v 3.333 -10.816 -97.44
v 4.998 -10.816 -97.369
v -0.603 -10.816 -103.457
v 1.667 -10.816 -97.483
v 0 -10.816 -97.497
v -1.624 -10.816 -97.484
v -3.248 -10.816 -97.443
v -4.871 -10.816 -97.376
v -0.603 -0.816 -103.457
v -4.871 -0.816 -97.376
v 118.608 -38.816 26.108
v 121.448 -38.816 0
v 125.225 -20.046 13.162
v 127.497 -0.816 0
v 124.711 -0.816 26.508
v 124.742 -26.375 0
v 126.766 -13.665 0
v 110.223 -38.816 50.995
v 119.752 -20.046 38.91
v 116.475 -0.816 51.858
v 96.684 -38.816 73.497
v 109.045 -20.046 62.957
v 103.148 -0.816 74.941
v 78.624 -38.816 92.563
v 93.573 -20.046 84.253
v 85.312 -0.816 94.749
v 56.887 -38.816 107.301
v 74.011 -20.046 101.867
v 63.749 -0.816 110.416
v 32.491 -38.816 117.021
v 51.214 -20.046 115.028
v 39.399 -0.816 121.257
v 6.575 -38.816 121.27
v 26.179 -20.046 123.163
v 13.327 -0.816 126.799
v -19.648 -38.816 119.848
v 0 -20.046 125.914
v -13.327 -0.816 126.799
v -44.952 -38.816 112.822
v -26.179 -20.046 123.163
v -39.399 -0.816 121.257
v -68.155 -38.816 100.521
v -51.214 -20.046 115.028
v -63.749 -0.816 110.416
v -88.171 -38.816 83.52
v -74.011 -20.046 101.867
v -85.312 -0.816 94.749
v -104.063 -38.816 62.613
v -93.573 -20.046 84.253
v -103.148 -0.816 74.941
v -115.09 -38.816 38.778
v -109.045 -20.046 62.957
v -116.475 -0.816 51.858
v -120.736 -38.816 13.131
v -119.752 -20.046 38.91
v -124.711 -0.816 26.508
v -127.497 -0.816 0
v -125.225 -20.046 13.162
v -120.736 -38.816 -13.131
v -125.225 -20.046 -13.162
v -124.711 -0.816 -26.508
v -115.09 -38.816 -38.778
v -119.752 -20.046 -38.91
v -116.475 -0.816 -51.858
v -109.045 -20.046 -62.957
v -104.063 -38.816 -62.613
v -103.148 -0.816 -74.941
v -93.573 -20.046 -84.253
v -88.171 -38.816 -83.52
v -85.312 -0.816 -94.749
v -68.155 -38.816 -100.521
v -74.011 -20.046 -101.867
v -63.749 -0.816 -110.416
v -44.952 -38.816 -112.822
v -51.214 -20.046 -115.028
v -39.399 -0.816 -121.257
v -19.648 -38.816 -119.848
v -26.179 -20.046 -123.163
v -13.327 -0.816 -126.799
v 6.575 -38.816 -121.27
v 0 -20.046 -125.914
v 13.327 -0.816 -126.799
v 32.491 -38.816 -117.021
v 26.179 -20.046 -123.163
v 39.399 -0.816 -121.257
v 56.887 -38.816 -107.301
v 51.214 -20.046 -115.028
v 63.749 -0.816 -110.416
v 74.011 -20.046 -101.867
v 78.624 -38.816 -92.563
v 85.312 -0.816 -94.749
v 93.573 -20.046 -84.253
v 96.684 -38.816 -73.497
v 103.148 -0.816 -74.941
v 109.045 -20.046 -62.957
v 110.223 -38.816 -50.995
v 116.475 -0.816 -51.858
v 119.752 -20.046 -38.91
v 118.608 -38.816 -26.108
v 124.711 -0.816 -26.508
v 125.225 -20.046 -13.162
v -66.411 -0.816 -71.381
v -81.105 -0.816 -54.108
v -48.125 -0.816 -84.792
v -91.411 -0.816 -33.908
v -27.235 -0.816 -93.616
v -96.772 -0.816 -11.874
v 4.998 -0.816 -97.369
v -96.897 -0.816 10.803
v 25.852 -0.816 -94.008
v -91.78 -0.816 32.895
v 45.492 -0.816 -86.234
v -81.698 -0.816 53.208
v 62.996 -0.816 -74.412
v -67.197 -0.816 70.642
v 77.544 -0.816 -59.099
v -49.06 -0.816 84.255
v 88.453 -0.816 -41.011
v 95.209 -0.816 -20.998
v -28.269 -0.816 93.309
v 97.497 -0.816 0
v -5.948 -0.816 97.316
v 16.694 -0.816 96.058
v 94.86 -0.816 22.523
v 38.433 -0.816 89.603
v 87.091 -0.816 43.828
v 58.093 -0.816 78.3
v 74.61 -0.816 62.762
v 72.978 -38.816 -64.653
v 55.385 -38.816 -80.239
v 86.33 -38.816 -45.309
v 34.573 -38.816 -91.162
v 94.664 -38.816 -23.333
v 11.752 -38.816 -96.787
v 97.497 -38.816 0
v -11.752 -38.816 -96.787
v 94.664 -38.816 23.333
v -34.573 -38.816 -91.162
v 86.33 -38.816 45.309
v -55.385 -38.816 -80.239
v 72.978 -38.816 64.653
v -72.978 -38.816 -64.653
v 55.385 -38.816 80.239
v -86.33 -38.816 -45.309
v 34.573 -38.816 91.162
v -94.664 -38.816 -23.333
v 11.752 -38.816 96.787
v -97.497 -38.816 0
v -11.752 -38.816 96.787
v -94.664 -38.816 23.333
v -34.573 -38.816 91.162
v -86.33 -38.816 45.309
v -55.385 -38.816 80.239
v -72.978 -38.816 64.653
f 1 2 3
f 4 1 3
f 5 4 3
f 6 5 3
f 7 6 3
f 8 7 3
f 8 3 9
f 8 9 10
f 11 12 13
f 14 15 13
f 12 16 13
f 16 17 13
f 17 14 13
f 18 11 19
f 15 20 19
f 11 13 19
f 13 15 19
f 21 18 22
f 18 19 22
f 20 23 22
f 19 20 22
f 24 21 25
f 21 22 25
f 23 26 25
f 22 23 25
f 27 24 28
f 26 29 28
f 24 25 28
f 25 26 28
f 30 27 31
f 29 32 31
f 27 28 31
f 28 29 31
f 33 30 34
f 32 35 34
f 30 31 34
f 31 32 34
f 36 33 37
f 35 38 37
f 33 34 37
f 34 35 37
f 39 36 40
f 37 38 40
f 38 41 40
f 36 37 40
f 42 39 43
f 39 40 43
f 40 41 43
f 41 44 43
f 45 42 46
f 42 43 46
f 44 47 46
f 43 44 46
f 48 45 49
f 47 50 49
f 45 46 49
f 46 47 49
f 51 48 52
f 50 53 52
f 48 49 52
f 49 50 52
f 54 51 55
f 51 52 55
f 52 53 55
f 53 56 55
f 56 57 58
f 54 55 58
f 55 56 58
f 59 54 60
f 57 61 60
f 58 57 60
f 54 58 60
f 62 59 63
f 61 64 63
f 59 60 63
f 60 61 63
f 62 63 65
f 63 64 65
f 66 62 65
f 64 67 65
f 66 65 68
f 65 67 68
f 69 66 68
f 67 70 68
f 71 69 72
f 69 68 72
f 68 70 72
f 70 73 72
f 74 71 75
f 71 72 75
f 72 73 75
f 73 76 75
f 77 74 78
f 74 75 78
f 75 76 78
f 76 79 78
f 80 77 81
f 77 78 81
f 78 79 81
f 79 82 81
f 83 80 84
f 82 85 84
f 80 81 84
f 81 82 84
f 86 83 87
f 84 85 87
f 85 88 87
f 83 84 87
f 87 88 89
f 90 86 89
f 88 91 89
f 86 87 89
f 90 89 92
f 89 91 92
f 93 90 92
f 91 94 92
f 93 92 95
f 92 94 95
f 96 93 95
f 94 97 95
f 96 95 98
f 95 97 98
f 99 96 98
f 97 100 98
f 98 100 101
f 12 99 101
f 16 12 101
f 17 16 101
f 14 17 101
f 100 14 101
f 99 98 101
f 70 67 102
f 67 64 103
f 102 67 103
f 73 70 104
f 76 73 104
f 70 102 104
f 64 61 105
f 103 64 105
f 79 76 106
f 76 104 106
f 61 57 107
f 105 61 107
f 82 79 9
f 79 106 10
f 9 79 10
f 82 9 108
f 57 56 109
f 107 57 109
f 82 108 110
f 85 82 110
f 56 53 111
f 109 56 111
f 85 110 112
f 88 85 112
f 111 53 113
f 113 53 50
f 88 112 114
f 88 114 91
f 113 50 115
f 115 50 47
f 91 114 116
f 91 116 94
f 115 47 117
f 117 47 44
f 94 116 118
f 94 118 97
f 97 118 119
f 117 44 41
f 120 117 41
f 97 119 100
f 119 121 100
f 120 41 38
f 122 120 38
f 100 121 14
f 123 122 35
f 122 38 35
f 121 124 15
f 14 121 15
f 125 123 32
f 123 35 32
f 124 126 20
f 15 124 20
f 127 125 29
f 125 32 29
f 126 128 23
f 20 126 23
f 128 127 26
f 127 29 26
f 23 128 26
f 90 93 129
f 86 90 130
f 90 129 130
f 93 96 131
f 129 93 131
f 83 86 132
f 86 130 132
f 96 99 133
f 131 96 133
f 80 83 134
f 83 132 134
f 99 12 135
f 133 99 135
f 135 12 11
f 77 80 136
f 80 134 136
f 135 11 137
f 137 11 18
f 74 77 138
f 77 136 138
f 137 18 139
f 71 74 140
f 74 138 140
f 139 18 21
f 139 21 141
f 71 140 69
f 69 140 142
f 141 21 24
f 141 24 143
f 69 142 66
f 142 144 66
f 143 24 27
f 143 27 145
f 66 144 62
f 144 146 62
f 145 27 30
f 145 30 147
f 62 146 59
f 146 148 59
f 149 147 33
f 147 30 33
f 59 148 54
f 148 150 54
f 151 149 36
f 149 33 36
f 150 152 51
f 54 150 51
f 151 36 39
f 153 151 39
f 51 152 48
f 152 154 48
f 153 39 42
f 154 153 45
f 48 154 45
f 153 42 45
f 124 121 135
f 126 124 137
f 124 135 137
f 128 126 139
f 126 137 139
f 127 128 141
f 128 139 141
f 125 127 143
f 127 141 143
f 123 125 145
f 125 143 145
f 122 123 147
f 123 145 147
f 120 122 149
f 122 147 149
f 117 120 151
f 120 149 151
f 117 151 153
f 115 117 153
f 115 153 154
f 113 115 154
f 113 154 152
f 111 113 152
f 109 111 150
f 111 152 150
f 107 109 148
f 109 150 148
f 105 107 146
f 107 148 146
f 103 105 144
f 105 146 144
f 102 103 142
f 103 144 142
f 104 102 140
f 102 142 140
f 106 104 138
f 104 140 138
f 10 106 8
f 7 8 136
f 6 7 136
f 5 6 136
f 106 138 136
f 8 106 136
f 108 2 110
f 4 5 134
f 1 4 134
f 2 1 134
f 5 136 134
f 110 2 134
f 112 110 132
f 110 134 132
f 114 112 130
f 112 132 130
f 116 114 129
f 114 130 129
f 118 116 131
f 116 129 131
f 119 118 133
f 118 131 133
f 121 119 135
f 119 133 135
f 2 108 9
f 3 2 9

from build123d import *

# Parameters (mm, degrees)
F3_DEPTH = 10


with BuildPart() as f1:
    # F0 (on Top) → F1 (revolve)
    with BuildSketch(Plane.XY):
        with BuildLine():
            Line((97.4973875252, -38.8161949813), (121.4477377606, -38.8161949813))
            ThreePointArc((121.4477377606, -38.8161949813), (120.5697284263, -19.6675259883), (117.0955747366, -0.8161949813))
            Line((117.0955747366, -0.8161949813), (97.4973875252, -0.8161949813))
            Line((97.4973875252, -0.8161949813), (97.4973875252, -38.8161949813))
        make_face()
        with BuildLine():
            ThreePointArc((117.0955747366, -0.8161949813), (120.5697284263, -19.6675259883), (121.4477377606, -38.8161949813))
            ThreePointArc((121.4477377606, -38.8161949813), (125.914331396, -20.045726455), (127.4973875252, -0.8161949813))
            Line((127.4973875252, -0.8161949813), (117.0955747366, -0.8161949813))
        make_face()
    revolve(axis=Axis((0, 9.7614582628, 0), (0, -1, 0)))

    # F2 (on face) → F3 (cut)
    with BuildSketch(Plane(origin=(0, -0.8161949813, 0), x_dir=(-1, 0, 0), z_dir=(0, 1, 0))):
        with BuildLine():
            Line((-4.9983559861, -97.3691789617), (0.6029718567, -103.4572258853))
            Line((0.6029718567, -103.4572258853), (4.8713640334, -97.375614949))
            ThreePointArc((4.8713640334, -97.375614949), (2.4364429045, -97.4669396268), (0, -97.4973875252))
            ThreePointArc((0, -97.4973875252), (-2.5, -97.465330114), (-4.9983559861, -97.3691789617))
        make_face()
    extrude(amount=-F3_DEPTH, mode=Mode.SUBTRACT)


solid = f1.part
